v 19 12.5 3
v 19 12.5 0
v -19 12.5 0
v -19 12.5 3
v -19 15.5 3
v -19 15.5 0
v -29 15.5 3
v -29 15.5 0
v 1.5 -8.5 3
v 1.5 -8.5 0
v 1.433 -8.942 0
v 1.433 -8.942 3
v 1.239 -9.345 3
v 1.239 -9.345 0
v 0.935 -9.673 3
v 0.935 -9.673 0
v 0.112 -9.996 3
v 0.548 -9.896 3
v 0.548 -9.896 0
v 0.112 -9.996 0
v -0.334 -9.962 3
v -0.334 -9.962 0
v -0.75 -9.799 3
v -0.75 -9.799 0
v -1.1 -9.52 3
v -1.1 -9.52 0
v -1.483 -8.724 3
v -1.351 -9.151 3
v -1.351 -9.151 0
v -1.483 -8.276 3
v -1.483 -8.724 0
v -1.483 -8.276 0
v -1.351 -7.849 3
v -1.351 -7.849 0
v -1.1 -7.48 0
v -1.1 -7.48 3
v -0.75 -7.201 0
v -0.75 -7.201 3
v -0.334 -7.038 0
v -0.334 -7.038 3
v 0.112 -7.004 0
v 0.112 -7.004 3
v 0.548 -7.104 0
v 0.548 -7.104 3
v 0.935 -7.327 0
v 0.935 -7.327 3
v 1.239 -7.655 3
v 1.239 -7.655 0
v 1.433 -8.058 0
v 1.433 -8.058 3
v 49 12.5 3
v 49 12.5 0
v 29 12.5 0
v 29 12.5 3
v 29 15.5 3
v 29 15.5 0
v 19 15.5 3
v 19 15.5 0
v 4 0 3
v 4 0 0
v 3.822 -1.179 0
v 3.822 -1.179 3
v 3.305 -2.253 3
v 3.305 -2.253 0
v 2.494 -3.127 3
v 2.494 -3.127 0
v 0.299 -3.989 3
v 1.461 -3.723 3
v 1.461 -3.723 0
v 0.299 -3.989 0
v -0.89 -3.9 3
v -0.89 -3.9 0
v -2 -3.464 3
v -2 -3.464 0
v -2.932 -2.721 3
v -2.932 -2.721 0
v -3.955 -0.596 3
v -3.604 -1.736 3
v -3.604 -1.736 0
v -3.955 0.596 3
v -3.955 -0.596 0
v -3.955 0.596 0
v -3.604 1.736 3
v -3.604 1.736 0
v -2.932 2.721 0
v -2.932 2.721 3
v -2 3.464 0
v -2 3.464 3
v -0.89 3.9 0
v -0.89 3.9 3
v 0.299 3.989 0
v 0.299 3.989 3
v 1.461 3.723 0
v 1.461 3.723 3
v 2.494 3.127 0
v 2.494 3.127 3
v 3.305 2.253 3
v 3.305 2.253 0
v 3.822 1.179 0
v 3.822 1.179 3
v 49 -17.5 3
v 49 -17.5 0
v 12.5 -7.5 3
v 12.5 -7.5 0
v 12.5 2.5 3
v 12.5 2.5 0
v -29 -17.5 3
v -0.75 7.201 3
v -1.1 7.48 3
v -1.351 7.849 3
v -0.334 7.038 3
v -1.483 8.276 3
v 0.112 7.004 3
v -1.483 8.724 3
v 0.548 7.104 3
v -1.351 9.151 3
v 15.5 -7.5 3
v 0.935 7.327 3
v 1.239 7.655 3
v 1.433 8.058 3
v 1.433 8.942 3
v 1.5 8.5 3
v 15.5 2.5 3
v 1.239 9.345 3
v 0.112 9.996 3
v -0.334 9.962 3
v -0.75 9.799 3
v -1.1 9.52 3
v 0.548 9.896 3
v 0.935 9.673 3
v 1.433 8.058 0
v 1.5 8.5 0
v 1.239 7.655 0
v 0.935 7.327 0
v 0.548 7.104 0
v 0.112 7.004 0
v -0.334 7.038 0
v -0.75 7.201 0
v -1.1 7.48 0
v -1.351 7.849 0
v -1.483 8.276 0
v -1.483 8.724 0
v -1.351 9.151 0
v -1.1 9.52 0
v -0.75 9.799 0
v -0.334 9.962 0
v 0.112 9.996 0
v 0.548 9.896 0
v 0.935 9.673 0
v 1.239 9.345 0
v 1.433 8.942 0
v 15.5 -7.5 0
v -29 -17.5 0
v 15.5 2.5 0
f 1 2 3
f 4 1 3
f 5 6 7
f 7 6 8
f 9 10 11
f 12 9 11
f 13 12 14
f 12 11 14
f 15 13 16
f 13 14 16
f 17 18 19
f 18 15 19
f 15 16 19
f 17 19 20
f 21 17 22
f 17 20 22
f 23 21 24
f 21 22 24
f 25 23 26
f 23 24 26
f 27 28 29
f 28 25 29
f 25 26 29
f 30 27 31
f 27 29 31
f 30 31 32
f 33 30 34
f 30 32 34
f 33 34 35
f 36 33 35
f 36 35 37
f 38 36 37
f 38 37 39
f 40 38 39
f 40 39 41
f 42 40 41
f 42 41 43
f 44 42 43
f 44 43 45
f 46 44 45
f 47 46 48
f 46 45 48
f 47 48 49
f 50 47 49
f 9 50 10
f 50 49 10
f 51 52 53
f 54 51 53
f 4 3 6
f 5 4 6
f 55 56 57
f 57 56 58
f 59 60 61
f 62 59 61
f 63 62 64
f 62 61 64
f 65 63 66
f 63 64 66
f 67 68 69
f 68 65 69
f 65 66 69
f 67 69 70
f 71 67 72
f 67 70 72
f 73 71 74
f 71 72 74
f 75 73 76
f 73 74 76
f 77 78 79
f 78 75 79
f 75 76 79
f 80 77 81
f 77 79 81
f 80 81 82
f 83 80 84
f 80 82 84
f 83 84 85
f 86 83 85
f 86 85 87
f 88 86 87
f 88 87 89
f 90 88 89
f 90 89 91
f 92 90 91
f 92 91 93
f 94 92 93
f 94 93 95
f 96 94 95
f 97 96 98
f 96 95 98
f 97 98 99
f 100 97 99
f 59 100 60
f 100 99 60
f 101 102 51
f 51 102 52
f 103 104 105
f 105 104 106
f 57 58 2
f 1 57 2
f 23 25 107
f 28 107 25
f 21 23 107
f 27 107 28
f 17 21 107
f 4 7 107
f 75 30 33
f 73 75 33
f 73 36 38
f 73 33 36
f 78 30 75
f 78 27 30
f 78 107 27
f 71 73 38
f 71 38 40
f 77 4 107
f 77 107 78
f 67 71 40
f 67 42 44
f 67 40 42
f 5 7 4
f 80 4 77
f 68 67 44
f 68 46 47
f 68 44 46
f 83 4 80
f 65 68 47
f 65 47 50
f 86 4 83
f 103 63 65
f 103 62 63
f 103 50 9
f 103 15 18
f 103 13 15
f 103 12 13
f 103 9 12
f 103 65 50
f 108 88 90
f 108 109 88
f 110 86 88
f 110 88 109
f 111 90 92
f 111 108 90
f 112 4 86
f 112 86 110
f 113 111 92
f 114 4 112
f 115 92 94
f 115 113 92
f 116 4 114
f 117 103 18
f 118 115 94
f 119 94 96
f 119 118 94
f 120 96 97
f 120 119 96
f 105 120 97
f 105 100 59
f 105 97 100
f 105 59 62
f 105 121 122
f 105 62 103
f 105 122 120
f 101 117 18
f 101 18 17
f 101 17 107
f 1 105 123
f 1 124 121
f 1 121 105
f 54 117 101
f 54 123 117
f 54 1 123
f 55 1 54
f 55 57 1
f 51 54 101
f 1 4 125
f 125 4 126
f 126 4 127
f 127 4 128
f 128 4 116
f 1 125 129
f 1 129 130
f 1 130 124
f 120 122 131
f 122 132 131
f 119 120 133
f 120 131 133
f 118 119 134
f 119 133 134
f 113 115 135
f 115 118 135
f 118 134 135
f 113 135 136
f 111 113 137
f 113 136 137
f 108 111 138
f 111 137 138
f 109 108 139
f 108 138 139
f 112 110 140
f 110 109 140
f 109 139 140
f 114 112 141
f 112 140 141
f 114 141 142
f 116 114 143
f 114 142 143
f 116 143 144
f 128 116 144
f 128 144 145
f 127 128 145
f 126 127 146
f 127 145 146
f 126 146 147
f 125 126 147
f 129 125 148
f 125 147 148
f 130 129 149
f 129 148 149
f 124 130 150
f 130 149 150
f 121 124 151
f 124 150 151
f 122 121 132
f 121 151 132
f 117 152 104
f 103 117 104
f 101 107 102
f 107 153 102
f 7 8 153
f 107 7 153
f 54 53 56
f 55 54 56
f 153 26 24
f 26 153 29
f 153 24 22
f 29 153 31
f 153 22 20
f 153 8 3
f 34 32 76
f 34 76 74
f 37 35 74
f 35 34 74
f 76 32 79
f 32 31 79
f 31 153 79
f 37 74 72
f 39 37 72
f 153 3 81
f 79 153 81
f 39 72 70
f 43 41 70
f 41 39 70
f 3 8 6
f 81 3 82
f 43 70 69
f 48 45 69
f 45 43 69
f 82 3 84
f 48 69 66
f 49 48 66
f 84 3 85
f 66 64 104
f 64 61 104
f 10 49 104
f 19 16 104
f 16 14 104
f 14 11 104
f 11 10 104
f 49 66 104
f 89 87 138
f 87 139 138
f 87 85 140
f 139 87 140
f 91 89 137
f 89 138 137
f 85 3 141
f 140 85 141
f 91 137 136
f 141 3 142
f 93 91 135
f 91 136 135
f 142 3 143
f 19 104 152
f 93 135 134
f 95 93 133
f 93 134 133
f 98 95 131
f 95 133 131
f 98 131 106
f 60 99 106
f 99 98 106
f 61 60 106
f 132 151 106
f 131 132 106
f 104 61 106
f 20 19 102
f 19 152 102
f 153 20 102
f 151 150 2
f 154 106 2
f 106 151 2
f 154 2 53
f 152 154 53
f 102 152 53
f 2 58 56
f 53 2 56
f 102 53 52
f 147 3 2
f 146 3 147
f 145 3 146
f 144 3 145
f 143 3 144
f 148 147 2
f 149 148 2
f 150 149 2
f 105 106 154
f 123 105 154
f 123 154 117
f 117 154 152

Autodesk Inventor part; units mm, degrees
ref_plane "YZ Plane" through (0, 0, 0) normal (1, 0, 0) x (0, 1, 0)
ref_plane "XZ Plane" through (0, 0, 0) normal (0, 1, 0) x (-1, 0, 0)
ref_plane "XY Plane" through (0, 0, 0) normal (0, 0, 1) x (1, 0, 0)
sketch "Sketch1" plane through (0, 0, 0) normal (0, 0, 1) x (1, 0, 0)
  circle A0 centre (0, 0) radius 12.5 construction
  circle A1 centre (0, -8.5) radius 1.5 construction
  circle A2 centre (0, 8.5) radius 1.5 construction
  line L0 (-29, -17.5) -> (49, -17.5)
  line L1 (49, -17.5) -> (49, 12.5)
  line L2 (49, 12.5) -> (-29, 12.5)
  line L3 (-29, 12.5) -> (-29, -17.5)
  line L4 (-29, 12.5) -> (-19, 12.5)
  line L5 (-19, 12.5) -> (-19, 15.5)
  line L6 (-19, 15.5) -> (-29, 15.5)
  line L7 (-29, 15.5) -> (-29, 12.5)
  line L8 (10, 12.5) -> (27.5, 12.5)
  line L9 (19, 12.5) -> (29, 12.5)
  line L10 (29, 12.5) -> (29, 15.5)
  line L11 (29, 15.5) -> (19, 15.5)
  line L12 (19, 15.5) -> (19, 12.5)
  line L13 (12.5, 2.5) -> (15.5, 2.5)
  line L14 (15.5, 2.5) -> (15.5, -7.5)
  line L15 (15.5, -7.5) -> (12.5, -7.5)
  line L16 (12.5, -7.5) -> (12.5, 2.5)
  circle A3 centre (0, 0) radius 4
  circle A4 centre (0, -8.5) radius 1.5
  circle A5 centre (0, 8.5) radius 1.5
  point P0 (15.5, -2.5)
  point P1 (49, -2.5)
  dimension "d0" = 25
  dimension "d1" = 3
  dimension "d2" = 3
  dimension "d3" = 17
  dimension "d4" = 8.5
  dimension "d5" = 10
  dimension "d6" = 3
  dimension "d10" = 29
  dimension "d11" = 10
  dimension "d12" = 3
  dimension "d13" = 48
  dimension "d14" = 20
  dimension "d15" = 30
  dimension "d16" = 3
  dimension "d17" = 10
  dimension "d20" = 8
  dimension "d21" = 3
extrude "Extrusion1" add sketch "Sketch1" along normal blind 3
equation "\"d4\" = 0.5 * d3"
equation "\"d13\" = 2 * d10 - d11"
equation "\"d21\" = d1"
properties part number "Motor mount plate"
